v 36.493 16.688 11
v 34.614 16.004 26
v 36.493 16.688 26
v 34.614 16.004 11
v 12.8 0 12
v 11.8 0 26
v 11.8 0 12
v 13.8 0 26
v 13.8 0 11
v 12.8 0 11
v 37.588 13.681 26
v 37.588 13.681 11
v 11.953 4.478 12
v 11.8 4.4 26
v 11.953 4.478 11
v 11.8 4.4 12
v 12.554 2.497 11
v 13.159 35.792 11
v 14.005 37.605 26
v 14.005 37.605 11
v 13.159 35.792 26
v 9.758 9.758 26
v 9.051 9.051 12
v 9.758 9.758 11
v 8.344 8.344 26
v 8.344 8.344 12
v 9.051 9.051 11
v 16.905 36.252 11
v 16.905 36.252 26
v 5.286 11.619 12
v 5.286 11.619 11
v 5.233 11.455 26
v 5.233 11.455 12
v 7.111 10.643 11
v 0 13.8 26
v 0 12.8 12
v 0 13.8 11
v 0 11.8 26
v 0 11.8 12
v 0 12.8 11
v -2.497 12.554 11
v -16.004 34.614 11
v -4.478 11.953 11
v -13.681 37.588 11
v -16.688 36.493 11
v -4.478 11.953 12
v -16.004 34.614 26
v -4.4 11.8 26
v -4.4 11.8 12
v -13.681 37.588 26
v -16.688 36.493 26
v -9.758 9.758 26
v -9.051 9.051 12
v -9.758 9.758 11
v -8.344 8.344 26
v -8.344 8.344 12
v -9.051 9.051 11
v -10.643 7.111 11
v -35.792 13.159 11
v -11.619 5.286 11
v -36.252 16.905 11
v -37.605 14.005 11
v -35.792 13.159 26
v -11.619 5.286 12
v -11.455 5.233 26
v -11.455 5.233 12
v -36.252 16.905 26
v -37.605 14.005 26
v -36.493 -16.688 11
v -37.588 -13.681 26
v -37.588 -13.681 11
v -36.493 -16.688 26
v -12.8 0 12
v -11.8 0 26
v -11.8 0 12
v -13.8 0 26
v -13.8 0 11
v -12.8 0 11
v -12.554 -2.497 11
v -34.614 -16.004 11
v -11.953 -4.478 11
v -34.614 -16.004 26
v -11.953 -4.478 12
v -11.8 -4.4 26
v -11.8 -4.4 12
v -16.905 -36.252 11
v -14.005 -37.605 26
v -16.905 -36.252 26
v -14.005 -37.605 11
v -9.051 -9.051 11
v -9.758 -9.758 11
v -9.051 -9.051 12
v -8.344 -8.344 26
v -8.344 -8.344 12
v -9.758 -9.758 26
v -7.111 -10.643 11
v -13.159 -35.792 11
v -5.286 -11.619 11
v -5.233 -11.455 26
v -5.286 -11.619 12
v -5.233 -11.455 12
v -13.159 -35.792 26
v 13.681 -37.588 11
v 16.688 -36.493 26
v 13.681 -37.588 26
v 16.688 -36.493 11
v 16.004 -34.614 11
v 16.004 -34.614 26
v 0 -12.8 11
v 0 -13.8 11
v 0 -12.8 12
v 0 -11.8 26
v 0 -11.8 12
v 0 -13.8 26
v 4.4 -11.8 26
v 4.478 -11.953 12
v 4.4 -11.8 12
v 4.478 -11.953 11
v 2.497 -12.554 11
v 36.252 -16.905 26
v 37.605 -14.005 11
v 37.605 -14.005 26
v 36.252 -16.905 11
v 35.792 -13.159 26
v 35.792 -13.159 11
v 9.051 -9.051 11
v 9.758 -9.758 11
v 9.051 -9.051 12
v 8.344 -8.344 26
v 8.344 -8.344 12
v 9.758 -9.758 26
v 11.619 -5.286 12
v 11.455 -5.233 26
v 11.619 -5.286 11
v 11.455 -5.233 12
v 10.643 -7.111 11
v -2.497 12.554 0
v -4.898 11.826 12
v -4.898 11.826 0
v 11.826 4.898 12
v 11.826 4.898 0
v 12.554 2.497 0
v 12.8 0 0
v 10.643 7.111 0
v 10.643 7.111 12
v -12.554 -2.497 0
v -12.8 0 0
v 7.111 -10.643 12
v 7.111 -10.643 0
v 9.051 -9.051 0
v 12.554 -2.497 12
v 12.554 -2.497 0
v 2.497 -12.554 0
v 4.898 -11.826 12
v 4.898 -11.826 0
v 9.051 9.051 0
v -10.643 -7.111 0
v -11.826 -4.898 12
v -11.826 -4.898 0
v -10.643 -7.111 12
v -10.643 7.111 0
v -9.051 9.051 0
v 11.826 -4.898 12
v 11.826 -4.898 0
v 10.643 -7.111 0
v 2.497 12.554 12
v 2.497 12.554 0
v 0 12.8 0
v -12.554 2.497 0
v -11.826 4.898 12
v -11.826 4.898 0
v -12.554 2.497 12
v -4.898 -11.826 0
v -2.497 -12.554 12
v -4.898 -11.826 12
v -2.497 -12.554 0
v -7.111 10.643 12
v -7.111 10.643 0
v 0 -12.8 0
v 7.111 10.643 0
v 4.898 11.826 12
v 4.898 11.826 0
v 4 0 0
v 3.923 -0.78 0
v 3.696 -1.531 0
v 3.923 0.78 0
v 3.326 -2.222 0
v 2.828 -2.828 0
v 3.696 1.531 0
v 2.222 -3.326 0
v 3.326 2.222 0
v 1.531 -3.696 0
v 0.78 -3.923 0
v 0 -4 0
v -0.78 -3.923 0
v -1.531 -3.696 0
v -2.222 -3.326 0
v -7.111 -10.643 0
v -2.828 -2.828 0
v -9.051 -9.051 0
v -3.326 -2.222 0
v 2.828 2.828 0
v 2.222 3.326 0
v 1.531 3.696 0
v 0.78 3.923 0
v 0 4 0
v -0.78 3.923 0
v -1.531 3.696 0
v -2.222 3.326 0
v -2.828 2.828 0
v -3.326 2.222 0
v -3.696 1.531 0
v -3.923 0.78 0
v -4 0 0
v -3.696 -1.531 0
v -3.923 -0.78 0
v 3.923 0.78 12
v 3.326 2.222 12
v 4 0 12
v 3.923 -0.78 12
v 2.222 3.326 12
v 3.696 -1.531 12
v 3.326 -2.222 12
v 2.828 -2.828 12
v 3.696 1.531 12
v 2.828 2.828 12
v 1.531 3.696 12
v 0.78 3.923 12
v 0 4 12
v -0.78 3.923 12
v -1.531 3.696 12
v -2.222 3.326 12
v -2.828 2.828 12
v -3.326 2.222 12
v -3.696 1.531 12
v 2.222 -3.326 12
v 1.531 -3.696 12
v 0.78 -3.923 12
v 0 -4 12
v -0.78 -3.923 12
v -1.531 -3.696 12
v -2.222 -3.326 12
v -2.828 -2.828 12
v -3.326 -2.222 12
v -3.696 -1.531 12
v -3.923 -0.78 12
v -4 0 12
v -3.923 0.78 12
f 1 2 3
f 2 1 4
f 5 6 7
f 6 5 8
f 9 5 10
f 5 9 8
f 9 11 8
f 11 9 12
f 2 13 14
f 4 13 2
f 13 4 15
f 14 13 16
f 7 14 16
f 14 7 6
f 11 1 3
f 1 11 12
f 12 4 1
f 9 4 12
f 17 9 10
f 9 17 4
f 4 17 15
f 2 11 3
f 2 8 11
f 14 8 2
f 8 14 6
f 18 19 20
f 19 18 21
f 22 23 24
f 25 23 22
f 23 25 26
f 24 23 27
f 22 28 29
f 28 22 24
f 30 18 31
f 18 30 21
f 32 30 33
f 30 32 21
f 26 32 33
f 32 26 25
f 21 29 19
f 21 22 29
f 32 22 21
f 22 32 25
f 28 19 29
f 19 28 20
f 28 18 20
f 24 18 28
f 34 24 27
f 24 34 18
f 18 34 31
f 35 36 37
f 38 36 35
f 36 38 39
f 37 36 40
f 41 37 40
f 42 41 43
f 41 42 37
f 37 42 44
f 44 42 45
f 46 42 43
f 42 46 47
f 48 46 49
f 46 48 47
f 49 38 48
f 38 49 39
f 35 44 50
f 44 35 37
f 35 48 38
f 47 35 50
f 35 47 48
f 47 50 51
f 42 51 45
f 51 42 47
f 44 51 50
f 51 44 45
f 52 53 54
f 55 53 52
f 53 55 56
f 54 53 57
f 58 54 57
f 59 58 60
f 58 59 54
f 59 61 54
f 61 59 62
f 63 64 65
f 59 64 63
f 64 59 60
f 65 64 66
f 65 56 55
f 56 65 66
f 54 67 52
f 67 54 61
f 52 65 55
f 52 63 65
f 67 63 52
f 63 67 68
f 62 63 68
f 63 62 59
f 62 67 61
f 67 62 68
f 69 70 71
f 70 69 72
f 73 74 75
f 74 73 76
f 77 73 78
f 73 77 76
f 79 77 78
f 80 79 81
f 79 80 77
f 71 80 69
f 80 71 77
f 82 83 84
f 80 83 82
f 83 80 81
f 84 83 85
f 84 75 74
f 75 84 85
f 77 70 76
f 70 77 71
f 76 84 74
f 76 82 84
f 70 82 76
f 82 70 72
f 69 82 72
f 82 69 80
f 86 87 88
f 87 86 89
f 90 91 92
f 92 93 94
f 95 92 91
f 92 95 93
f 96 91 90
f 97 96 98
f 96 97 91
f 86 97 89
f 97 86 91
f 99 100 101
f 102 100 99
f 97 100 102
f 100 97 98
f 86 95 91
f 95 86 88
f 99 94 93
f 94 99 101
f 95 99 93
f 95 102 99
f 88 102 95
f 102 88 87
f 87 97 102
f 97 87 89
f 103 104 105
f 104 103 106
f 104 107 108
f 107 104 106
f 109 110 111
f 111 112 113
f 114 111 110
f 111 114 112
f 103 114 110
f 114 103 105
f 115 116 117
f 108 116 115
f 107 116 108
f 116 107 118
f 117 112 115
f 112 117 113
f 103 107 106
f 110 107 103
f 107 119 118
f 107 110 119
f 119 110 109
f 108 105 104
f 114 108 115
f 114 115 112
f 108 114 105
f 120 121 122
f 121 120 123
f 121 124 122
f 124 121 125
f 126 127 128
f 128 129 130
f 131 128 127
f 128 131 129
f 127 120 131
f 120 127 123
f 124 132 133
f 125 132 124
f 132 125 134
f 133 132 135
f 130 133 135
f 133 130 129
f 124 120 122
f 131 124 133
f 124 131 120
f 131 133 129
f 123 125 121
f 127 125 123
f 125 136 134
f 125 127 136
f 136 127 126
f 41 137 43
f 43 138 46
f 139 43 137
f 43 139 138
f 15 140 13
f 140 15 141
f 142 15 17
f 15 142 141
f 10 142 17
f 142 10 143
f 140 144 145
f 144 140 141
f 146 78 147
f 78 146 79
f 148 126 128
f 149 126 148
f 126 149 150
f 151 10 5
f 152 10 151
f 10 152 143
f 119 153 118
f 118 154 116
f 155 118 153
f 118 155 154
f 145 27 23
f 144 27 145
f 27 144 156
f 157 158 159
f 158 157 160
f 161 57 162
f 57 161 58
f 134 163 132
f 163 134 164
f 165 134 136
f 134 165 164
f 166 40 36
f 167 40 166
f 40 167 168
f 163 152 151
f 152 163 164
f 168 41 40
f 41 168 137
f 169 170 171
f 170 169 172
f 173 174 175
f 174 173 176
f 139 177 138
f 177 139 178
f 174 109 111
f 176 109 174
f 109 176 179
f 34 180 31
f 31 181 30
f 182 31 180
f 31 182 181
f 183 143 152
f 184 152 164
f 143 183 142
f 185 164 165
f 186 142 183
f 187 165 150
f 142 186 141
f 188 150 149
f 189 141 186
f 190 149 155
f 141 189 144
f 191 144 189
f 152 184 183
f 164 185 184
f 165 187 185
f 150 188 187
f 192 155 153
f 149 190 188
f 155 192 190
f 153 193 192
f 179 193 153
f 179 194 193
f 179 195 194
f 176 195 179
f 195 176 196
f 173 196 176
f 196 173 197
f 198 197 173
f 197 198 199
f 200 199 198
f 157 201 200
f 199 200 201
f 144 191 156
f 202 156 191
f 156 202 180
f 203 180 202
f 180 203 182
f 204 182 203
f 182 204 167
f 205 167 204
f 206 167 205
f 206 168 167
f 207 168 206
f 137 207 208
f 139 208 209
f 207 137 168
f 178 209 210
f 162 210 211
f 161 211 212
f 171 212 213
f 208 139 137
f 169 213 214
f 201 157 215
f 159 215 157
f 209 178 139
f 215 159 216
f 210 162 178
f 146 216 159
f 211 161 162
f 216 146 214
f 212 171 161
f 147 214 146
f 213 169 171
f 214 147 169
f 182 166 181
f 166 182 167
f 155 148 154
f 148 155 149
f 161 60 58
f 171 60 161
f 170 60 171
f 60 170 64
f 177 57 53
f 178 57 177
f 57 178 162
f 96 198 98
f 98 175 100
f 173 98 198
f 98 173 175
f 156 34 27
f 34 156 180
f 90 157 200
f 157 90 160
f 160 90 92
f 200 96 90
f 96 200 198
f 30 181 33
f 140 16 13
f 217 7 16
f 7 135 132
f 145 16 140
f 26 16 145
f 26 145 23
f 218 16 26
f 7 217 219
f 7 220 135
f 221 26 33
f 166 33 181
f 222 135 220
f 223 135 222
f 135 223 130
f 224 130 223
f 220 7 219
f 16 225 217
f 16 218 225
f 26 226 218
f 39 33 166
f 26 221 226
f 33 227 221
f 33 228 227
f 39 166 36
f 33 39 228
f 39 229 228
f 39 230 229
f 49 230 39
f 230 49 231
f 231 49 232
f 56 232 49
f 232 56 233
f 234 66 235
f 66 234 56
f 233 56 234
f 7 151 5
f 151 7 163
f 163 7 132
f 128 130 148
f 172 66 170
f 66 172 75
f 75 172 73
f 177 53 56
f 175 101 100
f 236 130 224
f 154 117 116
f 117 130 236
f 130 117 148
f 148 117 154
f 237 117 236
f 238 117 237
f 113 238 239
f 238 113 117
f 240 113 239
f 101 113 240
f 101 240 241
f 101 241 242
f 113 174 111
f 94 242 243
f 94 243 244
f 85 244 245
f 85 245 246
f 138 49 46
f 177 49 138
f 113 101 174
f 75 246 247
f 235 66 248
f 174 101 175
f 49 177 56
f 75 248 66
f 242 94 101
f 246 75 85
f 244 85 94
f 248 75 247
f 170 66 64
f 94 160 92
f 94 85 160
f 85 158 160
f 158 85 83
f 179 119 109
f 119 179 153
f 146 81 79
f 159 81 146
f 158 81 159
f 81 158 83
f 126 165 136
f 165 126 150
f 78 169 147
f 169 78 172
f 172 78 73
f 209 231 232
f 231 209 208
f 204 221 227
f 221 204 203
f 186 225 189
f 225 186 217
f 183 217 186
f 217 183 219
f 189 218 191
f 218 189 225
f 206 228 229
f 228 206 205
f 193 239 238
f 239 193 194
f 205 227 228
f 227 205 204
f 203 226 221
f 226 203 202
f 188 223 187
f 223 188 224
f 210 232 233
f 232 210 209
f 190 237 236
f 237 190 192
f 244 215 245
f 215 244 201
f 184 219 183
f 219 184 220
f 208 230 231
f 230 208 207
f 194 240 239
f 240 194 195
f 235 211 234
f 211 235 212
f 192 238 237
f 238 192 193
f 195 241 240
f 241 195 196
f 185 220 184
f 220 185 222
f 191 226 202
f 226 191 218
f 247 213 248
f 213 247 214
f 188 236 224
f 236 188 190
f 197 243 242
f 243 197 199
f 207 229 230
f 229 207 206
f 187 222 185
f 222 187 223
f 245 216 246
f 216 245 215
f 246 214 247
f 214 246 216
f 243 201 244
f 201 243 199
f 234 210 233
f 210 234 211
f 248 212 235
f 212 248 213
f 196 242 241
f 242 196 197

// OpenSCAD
$fn = 32;

// ----------------------------------------------------------------------
// Impeller: 80 mm, 8 blades, 26 mm tall
// ----------------------------------------------------------------------

// --- parameters (mm) ---
boss_d = 25.6;            // hub diameter
boss_h = 12;              // hub height
rotor_d = 80;             // outer diameter over the blades
vane_count = 8;           // number of blades
blade_t = 2;              // blade thickness
blade_h = 14;             // blade height
blade_in_r = 11.8;        // blade root radius
blade_out_r = 38;         // blade tip radius
sweep = 20;               // blade sweep, degrees
bore_d = 8;               // shaft bore

module hub() {
  cylinder(h = boss_h, d = boss_d);
}

module blade() {
  /* blade swept between two boxes: hull of the root and the tip section */
  hull() {
    translate([blade_in_r, 0, boss_h - 1])
      cube([blade_t, blade_t * 2.2, blade_h + 1], center = false);
    rotate([0, 0, sweep])
      translate([blade_out_r, 0, boss_h - 1])
        cube([blade_t, blade_t * 1.6, blade_h + 1], center = false);
  }
}

module blades() {
  for (i = [0 : vane_count - 1])
    rotate([0, 0, i * 360 / vane_count]) blade();
}

difference() {
  union() {
    hub();
    blades();
  }
  translate([0, 0, -1]) cylinder(h = boss_h + blade_h + 0 + 3, d = bore_d);
}
